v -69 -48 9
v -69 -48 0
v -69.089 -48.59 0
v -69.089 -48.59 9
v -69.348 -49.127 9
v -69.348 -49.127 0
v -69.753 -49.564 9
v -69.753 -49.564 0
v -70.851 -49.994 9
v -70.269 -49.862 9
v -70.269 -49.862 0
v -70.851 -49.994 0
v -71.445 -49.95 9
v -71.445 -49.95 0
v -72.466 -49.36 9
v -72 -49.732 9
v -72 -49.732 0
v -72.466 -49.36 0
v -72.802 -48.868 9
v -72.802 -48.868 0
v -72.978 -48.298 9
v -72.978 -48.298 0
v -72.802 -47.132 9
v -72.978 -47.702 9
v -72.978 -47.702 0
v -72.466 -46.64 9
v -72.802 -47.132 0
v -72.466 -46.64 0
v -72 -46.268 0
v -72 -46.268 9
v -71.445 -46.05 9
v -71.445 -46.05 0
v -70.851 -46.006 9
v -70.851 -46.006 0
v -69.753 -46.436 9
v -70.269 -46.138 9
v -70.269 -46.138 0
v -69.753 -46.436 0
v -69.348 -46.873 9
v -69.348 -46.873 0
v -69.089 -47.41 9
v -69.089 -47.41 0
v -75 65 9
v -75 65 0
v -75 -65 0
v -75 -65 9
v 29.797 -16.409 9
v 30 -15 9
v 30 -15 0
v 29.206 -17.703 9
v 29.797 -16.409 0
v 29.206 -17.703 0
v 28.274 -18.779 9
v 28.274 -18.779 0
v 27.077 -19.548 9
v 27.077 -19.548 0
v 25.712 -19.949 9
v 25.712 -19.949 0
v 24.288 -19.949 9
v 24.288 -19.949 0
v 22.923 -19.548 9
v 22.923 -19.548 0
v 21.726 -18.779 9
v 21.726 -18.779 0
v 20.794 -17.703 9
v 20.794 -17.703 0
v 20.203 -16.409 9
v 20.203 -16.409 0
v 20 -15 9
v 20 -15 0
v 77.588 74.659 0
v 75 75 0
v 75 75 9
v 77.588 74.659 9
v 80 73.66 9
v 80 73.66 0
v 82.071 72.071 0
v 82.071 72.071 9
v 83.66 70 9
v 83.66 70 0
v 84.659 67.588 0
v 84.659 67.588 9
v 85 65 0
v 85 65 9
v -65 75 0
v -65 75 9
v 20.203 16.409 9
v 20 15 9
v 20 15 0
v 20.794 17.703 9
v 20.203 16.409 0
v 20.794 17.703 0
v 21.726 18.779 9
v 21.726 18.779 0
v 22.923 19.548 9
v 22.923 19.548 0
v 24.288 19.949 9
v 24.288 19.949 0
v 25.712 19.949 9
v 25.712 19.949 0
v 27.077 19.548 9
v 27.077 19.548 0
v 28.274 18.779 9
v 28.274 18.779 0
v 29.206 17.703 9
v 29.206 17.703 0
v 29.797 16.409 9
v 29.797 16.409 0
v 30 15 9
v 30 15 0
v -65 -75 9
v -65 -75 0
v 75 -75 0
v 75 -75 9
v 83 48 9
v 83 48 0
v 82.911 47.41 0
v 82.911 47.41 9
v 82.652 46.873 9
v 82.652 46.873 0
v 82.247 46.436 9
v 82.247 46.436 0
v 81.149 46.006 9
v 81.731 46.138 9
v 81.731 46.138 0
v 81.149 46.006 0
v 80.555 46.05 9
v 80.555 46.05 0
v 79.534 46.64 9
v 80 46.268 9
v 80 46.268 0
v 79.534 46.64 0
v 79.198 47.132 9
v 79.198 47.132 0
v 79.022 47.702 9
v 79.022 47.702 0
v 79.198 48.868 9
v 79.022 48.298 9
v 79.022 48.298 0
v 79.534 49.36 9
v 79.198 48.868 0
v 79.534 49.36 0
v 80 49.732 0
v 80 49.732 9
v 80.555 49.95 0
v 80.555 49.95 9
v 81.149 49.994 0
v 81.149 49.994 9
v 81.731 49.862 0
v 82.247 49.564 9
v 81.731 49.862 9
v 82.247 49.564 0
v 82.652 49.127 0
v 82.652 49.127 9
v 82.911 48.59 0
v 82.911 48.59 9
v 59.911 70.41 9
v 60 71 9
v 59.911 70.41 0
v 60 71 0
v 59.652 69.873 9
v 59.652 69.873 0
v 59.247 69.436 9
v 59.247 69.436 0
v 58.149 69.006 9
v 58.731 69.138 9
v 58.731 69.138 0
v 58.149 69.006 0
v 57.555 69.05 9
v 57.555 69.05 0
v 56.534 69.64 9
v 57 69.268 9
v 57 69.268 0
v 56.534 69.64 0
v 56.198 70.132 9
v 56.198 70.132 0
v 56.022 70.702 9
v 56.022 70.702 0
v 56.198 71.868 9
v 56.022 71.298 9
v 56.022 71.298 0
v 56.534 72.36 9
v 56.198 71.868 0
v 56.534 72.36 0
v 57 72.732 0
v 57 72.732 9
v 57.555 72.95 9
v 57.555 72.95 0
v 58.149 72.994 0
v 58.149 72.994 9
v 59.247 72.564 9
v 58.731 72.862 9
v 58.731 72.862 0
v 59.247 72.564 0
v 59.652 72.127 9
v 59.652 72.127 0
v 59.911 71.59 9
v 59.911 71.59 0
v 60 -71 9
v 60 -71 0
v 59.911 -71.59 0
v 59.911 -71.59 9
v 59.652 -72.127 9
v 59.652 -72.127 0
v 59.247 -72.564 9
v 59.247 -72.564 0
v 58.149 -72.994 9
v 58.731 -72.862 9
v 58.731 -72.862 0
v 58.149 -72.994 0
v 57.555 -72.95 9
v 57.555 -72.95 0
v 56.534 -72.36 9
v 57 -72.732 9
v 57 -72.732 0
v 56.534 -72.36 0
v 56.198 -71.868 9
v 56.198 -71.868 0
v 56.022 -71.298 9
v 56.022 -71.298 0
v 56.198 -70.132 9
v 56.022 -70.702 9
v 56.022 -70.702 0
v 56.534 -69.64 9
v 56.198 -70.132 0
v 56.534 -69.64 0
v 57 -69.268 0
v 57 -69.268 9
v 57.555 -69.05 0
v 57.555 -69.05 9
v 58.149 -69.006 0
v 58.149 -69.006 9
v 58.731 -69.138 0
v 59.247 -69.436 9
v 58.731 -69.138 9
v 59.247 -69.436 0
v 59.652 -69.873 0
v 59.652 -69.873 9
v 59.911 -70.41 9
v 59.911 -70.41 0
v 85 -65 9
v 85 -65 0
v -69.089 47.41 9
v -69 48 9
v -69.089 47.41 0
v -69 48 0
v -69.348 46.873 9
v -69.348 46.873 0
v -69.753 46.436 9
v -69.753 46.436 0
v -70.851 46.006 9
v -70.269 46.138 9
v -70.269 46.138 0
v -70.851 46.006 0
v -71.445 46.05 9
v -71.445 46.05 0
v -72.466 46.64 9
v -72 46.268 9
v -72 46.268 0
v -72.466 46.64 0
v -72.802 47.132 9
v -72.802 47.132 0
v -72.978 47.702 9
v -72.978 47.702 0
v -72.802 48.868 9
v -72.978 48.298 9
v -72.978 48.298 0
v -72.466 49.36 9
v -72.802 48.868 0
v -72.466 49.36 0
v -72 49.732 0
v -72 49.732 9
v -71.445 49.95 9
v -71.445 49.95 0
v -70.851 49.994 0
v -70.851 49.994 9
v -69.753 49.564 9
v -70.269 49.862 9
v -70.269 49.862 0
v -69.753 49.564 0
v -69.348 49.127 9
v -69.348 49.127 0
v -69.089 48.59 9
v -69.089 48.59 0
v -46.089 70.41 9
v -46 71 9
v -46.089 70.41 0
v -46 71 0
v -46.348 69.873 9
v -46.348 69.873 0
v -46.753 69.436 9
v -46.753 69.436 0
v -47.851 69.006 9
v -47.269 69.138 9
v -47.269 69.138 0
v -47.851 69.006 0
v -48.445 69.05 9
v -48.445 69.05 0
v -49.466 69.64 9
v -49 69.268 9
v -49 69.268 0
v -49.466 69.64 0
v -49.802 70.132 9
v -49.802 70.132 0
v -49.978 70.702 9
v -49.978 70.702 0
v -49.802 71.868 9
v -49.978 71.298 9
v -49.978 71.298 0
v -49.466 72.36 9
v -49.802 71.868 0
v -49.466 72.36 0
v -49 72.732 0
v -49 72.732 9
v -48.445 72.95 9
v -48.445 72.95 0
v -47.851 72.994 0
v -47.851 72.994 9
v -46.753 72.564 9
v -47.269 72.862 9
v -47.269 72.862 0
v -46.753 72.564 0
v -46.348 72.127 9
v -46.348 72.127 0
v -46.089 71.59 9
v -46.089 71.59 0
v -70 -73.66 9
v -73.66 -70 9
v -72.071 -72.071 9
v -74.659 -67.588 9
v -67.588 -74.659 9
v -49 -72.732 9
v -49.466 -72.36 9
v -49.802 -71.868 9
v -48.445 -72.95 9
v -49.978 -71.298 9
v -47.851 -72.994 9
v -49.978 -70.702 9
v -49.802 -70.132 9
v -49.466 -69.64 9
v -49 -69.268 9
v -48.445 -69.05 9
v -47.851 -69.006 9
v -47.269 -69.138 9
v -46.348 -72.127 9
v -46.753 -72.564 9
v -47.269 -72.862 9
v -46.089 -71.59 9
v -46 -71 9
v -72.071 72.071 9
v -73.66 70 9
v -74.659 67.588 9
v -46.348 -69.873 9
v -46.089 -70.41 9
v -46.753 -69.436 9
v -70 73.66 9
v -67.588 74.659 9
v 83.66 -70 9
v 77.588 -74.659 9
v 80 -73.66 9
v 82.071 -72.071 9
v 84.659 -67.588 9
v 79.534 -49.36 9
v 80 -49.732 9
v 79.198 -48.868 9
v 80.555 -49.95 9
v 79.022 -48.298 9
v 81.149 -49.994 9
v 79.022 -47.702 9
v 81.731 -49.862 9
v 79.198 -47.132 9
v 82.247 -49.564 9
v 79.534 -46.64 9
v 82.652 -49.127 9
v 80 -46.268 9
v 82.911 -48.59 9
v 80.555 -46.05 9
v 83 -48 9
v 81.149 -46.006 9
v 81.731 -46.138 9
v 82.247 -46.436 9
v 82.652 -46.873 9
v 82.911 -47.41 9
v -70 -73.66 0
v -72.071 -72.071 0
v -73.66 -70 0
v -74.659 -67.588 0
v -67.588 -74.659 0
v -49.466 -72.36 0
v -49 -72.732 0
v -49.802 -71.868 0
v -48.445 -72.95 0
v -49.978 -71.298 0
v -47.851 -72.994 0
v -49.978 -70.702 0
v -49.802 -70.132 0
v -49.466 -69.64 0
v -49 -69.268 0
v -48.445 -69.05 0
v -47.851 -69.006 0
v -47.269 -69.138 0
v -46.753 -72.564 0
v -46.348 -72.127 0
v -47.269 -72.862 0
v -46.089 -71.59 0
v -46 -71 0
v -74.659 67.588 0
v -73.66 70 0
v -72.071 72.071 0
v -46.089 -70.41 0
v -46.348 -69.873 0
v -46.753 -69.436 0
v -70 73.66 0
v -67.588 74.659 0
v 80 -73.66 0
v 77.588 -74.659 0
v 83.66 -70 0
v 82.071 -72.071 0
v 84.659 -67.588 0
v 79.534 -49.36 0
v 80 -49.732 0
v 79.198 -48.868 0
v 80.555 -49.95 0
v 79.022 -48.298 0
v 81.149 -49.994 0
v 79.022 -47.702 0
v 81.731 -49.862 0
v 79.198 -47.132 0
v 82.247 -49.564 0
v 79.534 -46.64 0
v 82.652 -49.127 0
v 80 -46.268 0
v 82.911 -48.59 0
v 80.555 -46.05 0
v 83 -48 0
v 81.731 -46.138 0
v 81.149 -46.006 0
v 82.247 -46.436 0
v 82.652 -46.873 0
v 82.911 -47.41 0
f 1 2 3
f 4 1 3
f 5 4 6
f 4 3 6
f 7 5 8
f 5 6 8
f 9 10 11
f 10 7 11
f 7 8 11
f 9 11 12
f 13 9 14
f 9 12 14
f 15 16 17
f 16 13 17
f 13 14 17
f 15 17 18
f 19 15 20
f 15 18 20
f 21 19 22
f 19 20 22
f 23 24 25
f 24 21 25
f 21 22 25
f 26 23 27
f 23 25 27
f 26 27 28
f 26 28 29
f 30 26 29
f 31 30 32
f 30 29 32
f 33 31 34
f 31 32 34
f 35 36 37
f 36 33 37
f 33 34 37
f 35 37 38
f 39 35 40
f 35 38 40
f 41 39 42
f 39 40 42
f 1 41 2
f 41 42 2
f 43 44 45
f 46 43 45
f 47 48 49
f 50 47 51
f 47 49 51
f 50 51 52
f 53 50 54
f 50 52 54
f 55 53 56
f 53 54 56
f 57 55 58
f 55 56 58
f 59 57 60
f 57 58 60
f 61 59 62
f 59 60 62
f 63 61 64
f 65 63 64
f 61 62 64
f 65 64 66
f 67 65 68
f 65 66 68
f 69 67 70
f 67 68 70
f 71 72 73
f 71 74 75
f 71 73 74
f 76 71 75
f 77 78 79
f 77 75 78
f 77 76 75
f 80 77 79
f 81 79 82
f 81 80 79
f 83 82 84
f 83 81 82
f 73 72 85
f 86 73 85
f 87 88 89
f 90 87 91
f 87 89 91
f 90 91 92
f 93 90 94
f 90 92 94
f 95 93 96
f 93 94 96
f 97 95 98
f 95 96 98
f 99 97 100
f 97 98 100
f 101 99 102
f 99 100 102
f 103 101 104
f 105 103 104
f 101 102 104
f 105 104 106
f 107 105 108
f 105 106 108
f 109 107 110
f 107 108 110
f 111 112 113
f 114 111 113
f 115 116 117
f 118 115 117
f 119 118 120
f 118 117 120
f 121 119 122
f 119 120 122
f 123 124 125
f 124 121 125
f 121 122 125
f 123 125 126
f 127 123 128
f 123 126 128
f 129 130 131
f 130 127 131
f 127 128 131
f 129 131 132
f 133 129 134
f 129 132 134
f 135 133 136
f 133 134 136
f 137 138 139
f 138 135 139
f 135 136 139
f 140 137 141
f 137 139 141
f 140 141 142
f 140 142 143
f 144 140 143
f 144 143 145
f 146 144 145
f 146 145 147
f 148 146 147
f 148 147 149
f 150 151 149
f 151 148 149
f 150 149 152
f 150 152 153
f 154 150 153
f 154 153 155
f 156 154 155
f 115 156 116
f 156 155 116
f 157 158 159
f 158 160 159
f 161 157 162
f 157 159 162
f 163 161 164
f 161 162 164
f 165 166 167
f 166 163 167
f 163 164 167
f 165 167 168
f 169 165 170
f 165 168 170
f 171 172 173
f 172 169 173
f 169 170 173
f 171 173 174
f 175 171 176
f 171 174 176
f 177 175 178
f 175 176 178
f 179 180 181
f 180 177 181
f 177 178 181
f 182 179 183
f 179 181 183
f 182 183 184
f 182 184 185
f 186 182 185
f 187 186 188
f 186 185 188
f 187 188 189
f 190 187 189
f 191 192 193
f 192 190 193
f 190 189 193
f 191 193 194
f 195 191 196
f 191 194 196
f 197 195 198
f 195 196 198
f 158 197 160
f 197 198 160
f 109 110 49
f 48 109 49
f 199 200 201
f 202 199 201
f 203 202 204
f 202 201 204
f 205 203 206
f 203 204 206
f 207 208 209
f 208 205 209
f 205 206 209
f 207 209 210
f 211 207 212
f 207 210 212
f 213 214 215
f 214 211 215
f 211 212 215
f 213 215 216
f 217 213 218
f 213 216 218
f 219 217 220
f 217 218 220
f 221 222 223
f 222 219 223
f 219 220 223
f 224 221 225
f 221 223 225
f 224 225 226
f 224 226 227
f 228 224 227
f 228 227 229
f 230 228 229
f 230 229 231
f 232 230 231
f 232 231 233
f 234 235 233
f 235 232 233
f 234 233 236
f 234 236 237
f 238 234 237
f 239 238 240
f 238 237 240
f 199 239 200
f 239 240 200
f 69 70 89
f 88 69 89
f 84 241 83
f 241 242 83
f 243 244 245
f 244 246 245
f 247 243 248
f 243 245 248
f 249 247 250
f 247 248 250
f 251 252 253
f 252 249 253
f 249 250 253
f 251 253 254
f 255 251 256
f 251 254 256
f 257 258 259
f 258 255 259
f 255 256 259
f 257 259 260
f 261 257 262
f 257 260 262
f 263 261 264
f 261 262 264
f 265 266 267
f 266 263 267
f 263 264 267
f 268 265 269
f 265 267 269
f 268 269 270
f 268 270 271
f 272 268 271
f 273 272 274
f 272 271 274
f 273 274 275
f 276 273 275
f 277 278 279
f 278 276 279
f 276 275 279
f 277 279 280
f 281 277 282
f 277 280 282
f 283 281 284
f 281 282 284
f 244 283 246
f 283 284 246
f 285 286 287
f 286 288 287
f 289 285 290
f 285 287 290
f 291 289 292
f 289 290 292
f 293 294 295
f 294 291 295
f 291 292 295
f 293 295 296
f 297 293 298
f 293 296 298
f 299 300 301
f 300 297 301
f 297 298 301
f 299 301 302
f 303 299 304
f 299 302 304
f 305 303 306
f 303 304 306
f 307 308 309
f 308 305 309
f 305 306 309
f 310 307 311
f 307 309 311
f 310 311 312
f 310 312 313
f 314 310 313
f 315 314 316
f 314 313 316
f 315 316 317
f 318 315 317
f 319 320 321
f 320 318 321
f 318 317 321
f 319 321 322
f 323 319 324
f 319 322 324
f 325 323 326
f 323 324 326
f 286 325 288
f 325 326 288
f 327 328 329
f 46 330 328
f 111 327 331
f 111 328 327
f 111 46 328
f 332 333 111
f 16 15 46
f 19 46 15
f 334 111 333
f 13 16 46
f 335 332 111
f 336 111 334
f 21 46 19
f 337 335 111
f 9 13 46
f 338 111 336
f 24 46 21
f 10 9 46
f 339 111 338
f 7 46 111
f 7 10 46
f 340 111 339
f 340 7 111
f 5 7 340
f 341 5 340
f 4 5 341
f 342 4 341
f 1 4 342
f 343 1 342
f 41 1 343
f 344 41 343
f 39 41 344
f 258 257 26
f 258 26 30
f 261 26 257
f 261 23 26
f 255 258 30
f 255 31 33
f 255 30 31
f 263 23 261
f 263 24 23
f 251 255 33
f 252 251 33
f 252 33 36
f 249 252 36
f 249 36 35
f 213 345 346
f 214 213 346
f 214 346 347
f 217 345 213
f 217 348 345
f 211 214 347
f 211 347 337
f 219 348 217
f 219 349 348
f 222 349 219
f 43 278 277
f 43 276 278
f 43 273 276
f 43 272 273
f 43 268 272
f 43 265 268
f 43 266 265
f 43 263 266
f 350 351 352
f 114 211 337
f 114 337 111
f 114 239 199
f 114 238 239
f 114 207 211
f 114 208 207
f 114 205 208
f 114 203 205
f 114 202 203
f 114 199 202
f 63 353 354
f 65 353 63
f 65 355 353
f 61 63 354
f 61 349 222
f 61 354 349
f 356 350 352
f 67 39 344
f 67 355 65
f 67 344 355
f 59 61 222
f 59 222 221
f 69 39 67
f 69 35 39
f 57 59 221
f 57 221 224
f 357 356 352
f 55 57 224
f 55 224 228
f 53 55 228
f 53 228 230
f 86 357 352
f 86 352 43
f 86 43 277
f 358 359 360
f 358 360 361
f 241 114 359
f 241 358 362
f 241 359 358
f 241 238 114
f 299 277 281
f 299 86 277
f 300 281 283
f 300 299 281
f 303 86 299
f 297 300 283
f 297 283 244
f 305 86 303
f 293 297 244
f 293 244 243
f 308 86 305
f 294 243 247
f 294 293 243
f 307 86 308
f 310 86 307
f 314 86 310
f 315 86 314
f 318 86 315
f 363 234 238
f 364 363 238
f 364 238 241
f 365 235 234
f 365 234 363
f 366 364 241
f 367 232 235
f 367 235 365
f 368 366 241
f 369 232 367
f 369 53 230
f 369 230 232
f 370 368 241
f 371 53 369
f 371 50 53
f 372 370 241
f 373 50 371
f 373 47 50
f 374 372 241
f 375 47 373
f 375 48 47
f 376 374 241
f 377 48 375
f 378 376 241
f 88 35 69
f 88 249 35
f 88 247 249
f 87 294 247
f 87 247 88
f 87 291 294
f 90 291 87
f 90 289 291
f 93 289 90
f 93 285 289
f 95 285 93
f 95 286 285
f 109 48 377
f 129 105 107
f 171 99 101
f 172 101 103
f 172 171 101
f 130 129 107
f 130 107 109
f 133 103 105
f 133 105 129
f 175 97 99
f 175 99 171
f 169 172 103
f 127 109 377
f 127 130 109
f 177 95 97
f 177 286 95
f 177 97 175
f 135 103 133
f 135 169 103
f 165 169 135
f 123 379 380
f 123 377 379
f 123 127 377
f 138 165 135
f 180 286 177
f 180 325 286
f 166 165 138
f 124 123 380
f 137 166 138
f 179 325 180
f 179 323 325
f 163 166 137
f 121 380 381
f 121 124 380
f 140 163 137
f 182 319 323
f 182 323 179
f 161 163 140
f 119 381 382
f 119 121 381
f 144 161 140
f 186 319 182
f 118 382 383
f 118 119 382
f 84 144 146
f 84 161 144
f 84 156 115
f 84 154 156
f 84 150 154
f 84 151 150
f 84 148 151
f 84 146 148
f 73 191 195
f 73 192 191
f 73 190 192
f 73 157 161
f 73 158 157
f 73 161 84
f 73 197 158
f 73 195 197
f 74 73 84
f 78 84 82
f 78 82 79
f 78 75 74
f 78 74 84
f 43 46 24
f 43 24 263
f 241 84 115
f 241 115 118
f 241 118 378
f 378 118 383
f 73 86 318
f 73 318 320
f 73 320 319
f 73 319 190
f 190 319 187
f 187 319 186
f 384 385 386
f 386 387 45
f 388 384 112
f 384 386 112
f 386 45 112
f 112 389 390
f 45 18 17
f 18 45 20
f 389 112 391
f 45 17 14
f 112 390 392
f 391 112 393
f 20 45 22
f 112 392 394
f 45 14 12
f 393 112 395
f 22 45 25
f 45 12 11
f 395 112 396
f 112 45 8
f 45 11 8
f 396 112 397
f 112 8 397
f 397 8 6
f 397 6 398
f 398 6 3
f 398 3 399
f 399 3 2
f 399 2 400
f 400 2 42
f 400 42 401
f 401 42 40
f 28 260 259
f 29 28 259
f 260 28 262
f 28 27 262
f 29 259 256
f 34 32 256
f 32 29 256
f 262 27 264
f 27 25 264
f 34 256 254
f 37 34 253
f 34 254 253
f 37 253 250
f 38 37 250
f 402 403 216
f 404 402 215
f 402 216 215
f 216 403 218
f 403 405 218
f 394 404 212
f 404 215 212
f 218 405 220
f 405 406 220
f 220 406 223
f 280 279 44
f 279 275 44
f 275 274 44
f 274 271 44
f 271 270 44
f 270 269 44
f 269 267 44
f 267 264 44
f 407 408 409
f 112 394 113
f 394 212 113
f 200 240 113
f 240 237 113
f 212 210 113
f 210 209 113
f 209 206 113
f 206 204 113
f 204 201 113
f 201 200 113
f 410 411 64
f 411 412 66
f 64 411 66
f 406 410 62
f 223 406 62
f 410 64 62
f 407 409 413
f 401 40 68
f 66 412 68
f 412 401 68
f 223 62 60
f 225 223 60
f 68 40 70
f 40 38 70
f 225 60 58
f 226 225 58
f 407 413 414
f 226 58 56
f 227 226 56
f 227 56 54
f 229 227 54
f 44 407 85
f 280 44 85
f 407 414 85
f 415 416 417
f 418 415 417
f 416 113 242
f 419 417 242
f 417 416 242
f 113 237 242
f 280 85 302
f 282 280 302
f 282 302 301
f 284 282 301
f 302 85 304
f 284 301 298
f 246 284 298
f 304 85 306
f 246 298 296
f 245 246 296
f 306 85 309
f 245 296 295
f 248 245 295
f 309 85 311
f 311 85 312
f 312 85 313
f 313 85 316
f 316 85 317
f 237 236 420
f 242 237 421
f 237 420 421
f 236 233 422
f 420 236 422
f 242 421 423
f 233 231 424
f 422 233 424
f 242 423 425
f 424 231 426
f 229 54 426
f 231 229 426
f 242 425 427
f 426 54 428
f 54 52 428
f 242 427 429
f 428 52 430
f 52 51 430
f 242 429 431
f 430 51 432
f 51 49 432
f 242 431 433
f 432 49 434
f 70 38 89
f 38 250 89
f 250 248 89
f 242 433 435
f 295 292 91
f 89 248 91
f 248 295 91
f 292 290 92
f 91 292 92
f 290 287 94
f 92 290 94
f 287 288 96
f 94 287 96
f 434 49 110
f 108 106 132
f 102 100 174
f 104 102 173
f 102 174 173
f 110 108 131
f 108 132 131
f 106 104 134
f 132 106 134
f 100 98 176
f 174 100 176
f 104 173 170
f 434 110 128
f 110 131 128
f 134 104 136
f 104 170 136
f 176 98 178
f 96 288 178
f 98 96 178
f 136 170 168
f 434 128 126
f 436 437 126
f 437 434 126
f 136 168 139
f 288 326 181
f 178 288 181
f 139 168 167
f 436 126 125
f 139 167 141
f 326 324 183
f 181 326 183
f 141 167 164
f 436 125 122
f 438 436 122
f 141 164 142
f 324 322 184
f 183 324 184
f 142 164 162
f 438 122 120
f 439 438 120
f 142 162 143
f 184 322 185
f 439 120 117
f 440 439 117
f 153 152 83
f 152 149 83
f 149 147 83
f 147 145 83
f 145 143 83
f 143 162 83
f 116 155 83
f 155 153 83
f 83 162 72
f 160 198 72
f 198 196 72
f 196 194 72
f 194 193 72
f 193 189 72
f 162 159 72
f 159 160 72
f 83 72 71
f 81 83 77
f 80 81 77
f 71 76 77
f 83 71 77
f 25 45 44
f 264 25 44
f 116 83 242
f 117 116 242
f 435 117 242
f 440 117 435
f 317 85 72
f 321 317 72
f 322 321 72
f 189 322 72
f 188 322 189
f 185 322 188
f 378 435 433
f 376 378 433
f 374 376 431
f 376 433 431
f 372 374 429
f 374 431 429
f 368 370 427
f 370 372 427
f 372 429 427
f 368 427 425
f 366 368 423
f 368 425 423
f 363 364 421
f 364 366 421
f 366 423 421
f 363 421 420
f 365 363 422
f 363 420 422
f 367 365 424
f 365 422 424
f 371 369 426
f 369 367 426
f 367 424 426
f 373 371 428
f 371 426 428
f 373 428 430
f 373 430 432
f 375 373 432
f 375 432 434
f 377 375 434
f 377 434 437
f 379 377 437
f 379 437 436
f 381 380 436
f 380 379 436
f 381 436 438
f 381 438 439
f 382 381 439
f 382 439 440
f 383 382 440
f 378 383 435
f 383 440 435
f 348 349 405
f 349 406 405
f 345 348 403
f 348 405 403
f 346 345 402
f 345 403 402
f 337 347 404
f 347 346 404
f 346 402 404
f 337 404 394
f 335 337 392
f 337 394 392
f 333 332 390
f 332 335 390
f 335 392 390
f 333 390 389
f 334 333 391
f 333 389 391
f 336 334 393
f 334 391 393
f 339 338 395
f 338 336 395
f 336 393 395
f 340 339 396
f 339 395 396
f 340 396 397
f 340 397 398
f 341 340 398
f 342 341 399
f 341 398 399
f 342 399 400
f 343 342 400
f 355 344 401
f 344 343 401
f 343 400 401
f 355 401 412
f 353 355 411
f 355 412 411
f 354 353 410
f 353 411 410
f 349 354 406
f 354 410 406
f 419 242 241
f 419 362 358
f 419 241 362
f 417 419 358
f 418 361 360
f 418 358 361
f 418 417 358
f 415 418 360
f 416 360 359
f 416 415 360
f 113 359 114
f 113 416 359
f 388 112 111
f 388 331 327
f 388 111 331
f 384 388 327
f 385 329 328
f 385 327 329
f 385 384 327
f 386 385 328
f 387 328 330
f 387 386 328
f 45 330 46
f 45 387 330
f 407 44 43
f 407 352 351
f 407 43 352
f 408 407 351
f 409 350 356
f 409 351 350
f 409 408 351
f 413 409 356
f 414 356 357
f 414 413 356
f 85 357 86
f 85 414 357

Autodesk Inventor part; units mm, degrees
ref_plane "YZ Plane" through (0, 0, 0) normal (1, 0, 0) x (0, 1, 0)
ref_plane "XZ Plane" through (0, 0, 0) normal (0, 1, 0) x (-1, 0, 0)
ref_plane "XY Plane" through (0, 0, 0) normal (0, 0, 1) x (1, 0, 0)
sketch "Schizzo1" plane through (0, 0, 0) normal (0, 0, 1) x (1, 0, 0)
  line L0 (75, -65) -> (75, 65)
  line L1 (65, 75) -> (-75, 75)
  line L2 (-85, 65) -> (-85, -65)
  line L3 (-75, -75) -> (65, -75)
  arc A0 (-85, -65) -> (-75, -75) centre (-75, -65) ccw
  arc A1 (-75, 75) -> (-85, 65) centre (-75, 65) ccw
  arc A2 (75, 65) -> (65, 75) centre (65, 65) ccw
  arc A3 (65, -75) -> (75, -65) centre (65, -65) ccw
  circle A4 centre (-81, 48) radius 2
  circle A5 centre (-81, -48) radius 2
  circle A6 centre (71, 48) radius 2
  circle A7 centre (71, -48) radius 2
  circle A8 centre (-58, -71) radius 2
  circle A9 centre (-58, 71) radius 2
  circle A10 centre (48, 71) radius 2
  circle A11 centre (48, -71) radius 2
  dimension "d32" = 10
  dimension "d42" = 4
  dimension "d43" = 4
  dimension "d45" = 4
  dimension "d46" = 4
  dimension "d53" = 4
  dimension "d54" = 4
  dimension "d55" = 4
  dimension "d56" = 4
extrude "Estrusione2" add sketch "Schizzo1" along normal blind 9
sketch "Schizzo2" plane through (0, 0, 0) normal (0, 0, -1) x (-1, 0, 0)
  line L0 (75, -65) -> (75, 65)
  line L1 (65, 75) -> (-75, 75)
  line L2 (-85, 65) -> (-85, -65)
  line L3 (-75, -75) -> (65, -75)
  circle A0 centre (0, -36) radius 2
  circle A1 centre (0, 36) radius 2
  circle A2 centre (55, -36) radius 2
  circle A3 centre (55, 36) radius 2
  circle A4 centre (-75, -36) radius 2
  circle A5 centre (-75, 36) radius 2
  arc A6 (-85, -65) -> (-75, -75) centre (-75, -65) ccw
  arc A7 (-75, 75) -> (-85, 65) centre (-75, 65) ccw
  arc A8 (75, 65) -> (65, 75) centre (65, 65) ccw
  arc A9 (65, -75) -> (75, -65) centre (65, -65) ccw
  line L4 (-25, -20) -> (-25, -20)
  line L5 (-20, -15) -> (-20, 15)
  line L6 (-25, 20) -> (-25, 20)
  line L7 (-30, 15) -> (-30, -15)
  arc A10 (-30, -15) -> (-25, -20) centre (-25, -15) ccw
  arc A11 (-25, -20) -> (-20, -15) centre (-25, -15) ccw
  arc A12 (-20, 15) -> (-25, 20) centre (-25, 15) ccw
  arc A13 (-25, 20) -> (-30, 15) centre (-25, 15) ccw
  point P0 (0, 0)
  point P1 (0, 0)
  point P2 (-25, 0)
  dimension "d64" = 4
  dimension "d65" = 4
  dimension "d66" = 4
  dimension "d67" = 4
  dimension "d68" = 4
  dimension "d69" = 4
  dimension "d70" = 10
  dimension "d71" = 5
move or copy body "Sposta corpo1" bodies to move or copy 1 copy no translate (10, 0, 0)
extrude "Estrusione3" cut sketch "Schizzo2" against normal blind 9 contours A11 A10 L7 A13 A12 L5
